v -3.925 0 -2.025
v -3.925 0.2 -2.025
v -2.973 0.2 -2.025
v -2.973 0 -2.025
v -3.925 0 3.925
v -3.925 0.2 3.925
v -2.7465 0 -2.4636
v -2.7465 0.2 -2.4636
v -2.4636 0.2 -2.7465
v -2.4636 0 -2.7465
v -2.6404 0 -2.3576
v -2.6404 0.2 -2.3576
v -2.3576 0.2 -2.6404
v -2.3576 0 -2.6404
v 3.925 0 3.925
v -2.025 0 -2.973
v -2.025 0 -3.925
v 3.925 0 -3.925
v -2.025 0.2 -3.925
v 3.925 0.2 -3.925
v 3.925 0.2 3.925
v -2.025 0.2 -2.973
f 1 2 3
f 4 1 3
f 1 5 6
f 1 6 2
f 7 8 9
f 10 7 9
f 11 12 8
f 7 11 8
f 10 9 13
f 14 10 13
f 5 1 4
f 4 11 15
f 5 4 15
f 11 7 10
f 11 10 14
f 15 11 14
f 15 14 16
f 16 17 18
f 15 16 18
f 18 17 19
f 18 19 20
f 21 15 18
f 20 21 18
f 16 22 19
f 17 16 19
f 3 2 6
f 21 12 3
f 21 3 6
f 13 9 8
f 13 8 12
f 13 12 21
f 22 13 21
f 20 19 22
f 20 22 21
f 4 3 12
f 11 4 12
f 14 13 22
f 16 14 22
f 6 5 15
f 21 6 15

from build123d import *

# Parameters (mm, degrees)
SKETCH1_W           = 7.85
SKETCH1_H           = 7.85
BOSS_EXTRUDE1_DEPTH = 0.2
CUT_EXTRUDE1_DEPTH  = 1.2


with BuildPart() as part:
    # Sketch1 → Boss-Extrude1 (new body)
    with BuildSketch(Plane(origin=(0, 0, 0), x_dir=(1, 0, 0), z_dir=(0, 1, 0))):
        Rectangle(SKETCH1_W, SKETCH1_H)
    extrude(amount=BOSS_EXTRUDE1_DEPTH)

    # Sketch3 → Cut-Extrude1 (cut, through all)
    with BuildSketch(Plane(origin=(0, 0.2, 0), x_dir=(1, 0, 0), z_dir=(0, 1, 0))):
        Polygon((-3.925, 2.025), (-2.97297934, 2.025), (-2.640411026, 2.357568314), (-2.746477043, 2.463634331), (-2.463634331, 2.746477043), (-2.357568314, 2.640411026), (-2.025, 2.97297934), (-2.025, 3.925), (-3.925, 3.925), align=None)
    extrude(amount=-CUT_EXTRUDE1_DEPTH, mode=Mode.SUBTRACT)


solid = part.part
